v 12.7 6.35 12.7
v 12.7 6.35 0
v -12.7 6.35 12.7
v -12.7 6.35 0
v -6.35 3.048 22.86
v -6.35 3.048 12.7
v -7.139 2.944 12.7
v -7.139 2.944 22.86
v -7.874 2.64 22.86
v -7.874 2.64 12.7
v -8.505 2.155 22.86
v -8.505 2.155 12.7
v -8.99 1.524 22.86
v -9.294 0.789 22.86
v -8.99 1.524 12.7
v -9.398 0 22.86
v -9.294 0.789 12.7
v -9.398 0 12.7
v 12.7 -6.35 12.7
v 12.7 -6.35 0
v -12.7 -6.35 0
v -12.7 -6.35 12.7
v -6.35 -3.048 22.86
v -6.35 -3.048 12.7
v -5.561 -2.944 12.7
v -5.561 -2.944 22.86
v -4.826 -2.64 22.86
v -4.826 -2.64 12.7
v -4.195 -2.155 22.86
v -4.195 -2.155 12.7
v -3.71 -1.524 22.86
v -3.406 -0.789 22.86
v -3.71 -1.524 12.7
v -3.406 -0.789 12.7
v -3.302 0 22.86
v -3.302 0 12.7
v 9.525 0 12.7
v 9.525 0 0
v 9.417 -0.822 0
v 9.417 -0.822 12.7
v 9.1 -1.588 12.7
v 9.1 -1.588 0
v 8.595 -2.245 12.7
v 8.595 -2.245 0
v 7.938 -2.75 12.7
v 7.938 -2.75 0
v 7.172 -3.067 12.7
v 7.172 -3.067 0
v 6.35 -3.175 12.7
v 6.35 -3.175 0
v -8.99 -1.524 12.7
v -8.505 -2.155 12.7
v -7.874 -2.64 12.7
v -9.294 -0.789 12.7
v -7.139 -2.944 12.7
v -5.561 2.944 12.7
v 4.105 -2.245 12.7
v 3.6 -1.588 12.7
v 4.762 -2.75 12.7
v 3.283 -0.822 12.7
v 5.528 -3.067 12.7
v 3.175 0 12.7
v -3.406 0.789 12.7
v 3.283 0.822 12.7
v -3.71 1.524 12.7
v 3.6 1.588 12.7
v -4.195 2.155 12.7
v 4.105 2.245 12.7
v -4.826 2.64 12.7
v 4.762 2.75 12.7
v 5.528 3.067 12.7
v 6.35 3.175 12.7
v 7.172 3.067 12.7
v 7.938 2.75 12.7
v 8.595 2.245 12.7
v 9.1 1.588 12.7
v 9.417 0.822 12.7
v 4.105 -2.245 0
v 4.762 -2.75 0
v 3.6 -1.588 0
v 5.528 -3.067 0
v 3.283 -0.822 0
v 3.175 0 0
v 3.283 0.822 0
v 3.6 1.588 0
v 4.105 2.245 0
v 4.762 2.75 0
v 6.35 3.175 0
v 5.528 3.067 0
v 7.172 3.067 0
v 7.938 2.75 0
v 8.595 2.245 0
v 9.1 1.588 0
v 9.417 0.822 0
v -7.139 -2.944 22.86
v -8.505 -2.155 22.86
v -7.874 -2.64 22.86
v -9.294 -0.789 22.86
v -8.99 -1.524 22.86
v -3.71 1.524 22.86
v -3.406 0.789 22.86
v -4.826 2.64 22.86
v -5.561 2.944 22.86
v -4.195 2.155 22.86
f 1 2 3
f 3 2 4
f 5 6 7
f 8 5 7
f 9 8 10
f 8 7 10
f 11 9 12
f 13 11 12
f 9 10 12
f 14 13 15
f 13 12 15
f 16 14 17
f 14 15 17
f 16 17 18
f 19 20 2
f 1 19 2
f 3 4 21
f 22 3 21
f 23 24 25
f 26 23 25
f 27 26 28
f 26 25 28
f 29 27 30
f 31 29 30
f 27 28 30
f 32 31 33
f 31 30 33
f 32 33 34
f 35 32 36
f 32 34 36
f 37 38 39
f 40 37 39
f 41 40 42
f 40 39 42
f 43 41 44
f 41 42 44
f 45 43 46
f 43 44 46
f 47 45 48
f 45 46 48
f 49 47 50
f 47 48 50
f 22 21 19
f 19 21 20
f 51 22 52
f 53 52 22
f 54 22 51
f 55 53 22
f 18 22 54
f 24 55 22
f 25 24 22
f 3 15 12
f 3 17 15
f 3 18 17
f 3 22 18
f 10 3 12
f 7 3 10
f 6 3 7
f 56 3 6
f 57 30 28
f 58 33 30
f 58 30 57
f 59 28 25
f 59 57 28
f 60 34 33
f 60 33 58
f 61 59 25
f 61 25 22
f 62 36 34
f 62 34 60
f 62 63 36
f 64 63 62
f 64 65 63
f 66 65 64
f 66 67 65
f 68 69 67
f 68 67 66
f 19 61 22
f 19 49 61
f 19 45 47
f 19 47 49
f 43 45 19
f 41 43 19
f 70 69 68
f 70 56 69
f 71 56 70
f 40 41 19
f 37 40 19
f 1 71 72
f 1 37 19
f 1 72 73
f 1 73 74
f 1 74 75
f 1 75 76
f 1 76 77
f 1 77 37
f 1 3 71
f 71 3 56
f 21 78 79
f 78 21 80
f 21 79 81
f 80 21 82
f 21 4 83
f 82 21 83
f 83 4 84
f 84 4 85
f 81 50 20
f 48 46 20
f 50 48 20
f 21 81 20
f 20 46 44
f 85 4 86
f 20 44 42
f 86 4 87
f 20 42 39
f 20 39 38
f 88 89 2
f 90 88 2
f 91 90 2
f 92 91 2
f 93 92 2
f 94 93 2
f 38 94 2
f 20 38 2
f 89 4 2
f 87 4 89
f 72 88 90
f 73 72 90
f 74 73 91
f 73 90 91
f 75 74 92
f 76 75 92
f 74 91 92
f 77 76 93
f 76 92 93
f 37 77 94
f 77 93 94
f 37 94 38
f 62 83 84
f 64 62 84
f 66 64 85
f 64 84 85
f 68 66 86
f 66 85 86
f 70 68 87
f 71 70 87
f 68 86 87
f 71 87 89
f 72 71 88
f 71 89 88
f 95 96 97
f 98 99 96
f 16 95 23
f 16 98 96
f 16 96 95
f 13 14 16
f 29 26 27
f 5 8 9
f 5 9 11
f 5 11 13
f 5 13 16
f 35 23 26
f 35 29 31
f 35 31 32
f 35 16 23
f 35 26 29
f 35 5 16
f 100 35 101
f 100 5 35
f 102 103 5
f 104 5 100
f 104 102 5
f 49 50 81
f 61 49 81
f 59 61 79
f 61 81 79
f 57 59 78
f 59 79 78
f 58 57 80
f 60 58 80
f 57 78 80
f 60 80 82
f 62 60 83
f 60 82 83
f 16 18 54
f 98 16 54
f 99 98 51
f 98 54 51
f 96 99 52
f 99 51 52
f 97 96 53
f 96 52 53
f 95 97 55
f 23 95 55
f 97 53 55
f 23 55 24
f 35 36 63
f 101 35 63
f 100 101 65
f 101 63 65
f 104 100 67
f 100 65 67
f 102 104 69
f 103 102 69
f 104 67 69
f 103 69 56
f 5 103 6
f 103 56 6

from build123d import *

# Parameters (mm, degrees)
F1_DEPTH = 12.7
F3_DEPTH = 10.16


with BuildPart() as f1:
    # F0 (on Top) → F1 (new body)
    with BuildSketch(Plane.XY):
        with BuildLine():
            Line((-6.35, -6.35), (6.35, -6.35))
            Line((6.35, -6.35), (6.35, -3.175))
            ThreePointArc((6.35, -3.175), (4.1049359697, -2.2450640303), (3.175, 0))
            Line((3.175, 0), (-3.302, 0))
            ThreePointArc((-3.302, 0), (-4.1947385309, -2.1552614691), (-6.35, -3.048))
            Line((-6.35, -3.048), (-6.35, -6.35))
        make_face()
        with BuildLine():
            Line((-3.302, 0), (3.175, 0))
            ThreePointArc((3.175, 0), (4.1049359697, 2.2450640303), (6.35, 3.175))
            Line((6.35, 3.175), (6.35, 6.35))
            Line((6.35, 6.35), (-6.35, 6.35))
            Line((-6.35, 6.35), (-6.35, 3.048))
            ThreePointArc((-6.35, 3.048), (-4.1947385309, 2.1552614691), (-3.302, 0))
        make_face()
        with BuildLine():
            Line((9.525, 0), (12.7, 0))
            Line((12.7, 0), (12.7, 6.35))
            Line((12.7, 6.35), (6.35, 6.35))
            Line((6.35, 6.35), (6.35, 3.175))
            ThreePointArc((6.35, 3.175), (8.5950640303, 2.2450640303), (9.525, 0))
        make_face()
        with BuildLine():
            Line((6.35, -6.35), (12.7, -6.35))
            Line((12.7, -6.35), (12.7, 0))
            Line((12.7, 0), (9.525, 0))
            ThreePointArc((9.525, 0), (8.5950640303, -2.2450640303), (6.35, -3.175))
            Line((6.35, -3.175), (6.35, -6.35))
        make_face()
        with BuildLine():
            Line((-12.7, -6.35), (-6.35, -6.35))
            Line((-6.35, -6.35), (-6.35, -3.048))
            ThreePointArc((-6.35, -3.048), (-8.5052614691, -2.1552614691), (-9.398, 0))
            Line((-9.398, 0), (-12.7, 0))
            Line((-12.7, 0), (-12.7, -6.35))
        make_face()
        with BuildLine():
            Line((-12.7, 6.35), (-12.7, 0))
            Line((-12.7, 0), (-9.398, 0))
            ThreePointArc((-9.398, 0), (-8.5052614691, 2.1552614691), (-6.35, 3.048))
            Line((-6.35, 3.048), (-6.35, 6.35))
            Line((-6.35, 6.35), (-12.7, 6.35))
        make_face()
        with BuildLine():
            Line((-6.35, 3.048), (-6.35, 0))
            Line((-6.35, 0), (-3.302, 0))
            ThreePointArc((-3.302, 0), (-4.1947385309, 2.1552614691), (-6.35, 3.048))
        make_face()
        with BuildLine():
            Line((-9.398, 0), (-6.35, 0))
            Line((-6.35, 0), (-6.35, 3.048))
            ThreePointArc((-6.35, 3.048), (-8.5052614691, 2.1552614691), (-9.398, 0))
        make_face()
        with BuildLine():
            ThreePointArc((-9.398, 0), (-8.5052614691, -2.1552614691), (-6.35, -3.048))
            Line((-6.35, -3.048), (-6.35, 0))
            Line((-6.35, 0), (-9.398, 0))
        make_face()
        with BuildLine():
            Line((-6.35, 0), (-6.35, -3.048))
            ThreePointArc((-6.35, -3.048), (-4.1947385309, -2.1552614691), (-3.302, 0))
            Line((-3.302, 0), (-6.35, 0))
        make_face()
    extrude(amount=F1_DEPTH)

    # F2 (on face) → F3 (join)
    with BuildSketch(Plane.XY.offset(12.7)):
        with BuildLine():
            Line((-6.35, 0), (-6.35, -3.048))
            ThreePointArc((-6.35, -3.048), (-4.1947385309, -2.1552614691), (-3.302, 0))
            Line((-3.302, 0), (-6.35, 0))
        make_face()
        with BuildLine():
            Line((-6.35, 3.048), (-6.35, 0))
            Line((-6.35, 0), (-3.302, 0))
            ThreePointArc((-3.302, 0), (-4.1947385309, 2.1552614691), (-6.35, 3.048))
        make_face()
        with BuildLine():
            ThreePointArc((-9.398, 0), (-8.5052614691, -2.1552614691), (-6.35, -3.048))
            Line((-6.35, -3.048), (-6.35, 0))
            Line((-6.35, 0), (-9.398, 0))
        make_face()
        with BuildLine():
            Line((-9.398, 0), (-6.35, 0))
            Line((-6.35, 0), (-6.35, 3.048))
            ThreePointArc((-6.35, 3.048), (-8.5052614691, 2.1552614691), (-9.398, 0))
        make_face()
    extrude(amount=F3_DEPTH)


solid = f1.part
